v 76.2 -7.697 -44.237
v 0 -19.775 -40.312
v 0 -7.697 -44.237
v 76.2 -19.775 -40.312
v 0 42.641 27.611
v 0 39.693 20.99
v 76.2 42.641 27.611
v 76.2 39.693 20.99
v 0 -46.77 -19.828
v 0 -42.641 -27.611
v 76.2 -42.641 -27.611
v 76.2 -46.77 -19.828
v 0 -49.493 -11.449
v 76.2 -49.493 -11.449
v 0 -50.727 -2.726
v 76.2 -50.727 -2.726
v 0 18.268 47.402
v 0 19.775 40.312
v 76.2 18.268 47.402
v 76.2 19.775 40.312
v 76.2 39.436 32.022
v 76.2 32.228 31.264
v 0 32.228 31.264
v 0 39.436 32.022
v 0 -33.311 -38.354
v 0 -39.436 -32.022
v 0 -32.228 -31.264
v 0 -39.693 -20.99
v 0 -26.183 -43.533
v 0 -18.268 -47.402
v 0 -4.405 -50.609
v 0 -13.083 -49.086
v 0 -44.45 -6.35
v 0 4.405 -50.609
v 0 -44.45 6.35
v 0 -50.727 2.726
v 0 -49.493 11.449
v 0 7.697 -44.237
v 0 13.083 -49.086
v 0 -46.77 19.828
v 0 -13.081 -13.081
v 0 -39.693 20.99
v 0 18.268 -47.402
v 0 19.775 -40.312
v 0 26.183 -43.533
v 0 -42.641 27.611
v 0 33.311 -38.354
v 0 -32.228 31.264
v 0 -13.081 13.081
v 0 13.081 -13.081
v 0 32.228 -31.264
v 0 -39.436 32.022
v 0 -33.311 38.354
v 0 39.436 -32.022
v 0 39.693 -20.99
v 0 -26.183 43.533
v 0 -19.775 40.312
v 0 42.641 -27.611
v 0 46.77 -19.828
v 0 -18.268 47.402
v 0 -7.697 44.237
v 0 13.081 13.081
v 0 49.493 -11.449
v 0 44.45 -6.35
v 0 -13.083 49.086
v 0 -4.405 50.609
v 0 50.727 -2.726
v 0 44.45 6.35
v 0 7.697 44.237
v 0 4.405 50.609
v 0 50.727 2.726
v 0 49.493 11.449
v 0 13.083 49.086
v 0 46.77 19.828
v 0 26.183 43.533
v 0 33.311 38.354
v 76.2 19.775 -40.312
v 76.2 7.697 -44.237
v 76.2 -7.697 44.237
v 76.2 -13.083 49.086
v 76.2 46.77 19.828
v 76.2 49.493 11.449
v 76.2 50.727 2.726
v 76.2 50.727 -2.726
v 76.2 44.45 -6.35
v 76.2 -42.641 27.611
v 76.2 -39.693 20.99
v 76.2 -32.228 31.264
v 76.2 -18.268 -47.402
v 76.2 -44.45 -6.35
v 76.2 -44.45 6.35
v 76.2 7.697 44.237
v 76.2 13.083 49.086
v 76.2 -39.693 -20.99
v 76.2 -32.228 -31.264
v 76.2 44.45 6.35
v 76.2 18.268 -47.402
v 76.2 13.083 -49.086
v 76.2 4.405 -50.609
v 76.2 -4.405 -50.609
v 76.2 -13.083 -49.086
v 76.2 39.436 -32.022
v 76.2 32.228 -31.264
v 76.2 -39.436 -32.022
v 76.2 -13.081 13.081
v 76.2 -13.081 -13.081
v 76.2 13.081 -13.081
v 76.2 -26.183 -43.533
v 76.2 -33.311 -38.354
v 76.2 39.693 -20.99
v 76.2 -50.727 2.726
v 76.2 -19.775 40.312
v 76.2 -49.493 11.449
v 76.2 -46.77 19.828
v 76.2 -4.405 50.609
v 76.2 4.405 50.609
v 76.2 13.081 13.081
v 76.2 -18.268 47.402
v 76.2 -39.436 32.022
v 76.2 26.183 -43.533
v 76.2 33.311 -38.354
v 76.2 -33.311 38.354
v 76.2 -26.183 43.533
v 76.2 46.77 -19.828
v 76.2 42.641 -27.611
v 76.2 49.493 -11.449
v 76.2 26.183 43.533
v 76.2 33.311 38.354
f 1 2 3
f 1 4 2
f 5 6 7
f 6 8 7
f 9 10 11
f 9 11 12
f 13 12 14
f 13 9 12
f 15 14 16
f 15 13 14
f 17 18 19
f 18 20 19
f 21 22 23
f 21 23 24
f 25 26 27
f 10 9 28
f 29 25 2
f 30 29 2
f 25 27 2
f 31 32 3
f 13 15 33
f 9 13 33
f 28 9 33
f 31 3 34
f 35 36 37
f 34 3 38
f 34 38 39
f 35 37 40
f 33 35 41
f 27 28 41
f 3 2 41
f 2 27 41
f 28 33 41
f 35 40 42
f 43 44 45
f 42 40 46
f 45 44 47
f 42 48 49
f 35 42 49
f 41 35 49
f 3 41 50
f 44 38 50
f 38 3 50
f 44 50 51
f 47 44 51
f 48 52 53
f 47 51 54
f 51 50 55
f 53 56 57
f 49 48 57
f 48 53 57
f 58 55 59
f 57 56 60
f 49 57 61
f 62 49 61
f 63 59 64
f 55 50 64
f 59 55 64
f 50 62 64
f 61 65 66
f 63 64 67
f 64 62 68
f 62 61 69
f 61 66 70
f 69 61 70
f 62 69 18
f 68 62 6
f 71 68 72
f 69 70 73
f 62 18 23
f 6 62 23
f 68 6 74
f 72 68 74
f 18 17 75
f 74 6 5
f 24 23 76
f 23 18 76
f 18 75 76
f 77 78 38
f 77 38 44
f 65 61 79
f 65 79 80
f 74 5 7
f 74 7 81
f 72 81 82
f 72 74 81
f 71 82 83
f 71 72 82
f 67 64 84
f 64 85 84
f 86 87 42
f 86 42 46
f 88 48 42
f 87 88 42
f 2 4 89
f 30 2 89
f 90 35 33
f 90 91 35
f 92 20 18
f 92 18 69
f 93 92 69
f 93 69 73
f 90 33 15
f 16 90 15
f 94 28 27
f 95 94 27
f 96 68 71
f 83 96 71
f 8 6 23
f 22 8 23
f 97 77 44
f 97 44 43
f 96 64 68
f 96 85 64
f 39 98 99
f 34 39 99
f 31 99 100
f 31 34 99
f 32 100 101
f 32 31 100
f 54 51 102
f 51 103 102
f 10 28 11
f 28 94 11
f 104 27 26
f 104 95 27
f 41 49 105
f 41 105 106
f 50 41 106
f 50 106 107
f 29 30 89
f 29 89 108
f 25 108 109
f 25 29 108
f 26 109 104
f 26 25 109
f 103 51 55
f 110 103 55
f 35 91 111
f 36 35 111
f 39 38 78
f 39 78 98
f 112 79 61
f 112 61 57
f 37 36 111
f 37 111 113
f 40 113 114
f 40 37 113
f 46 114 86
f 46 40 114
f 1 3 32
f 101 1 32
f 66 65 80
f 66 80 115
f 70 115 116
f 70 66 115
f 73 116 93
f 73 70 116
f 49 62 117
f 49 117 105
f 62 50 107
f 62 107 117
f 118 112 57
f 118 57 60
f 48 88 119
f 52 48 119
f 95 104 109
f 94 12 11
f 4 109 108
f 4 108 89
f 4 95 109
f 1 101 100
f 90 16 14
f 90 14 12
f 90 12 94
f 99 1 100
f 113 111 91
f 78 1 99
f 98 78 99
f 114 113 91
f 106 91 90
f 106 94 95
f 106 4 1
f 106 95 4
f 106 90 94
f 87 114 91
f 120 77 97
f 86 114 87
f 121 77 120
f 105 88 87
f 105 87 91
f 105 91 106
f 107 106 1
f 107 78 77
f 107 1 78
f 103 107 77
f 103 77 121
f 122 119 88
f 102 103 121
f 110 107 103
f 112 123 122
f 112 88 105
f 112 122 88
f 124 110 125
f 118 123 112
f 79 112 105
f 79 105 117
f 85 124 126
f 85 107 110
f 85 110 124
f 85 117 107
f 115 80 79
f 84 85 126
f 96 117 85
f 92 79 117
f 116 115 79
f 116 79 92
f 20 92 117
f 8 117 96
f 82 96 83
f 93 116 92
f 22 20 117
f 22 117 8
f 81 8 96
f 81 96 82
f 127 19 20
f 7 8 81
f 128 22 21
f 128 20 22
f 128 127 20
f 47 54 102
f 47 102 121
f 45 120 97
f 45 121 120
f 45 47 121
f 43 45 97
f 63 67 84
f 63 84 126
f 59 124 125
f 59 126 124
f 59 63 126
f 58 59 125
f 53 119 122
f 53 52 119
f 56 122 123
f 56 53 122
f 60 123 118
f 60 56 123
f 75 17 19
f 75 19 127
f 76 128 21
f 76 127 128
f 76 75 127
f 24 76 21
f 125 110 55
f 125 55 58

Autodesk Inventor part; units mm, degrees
ref_plane "YZ Plane" through (0, 0, 0) normal (1, 0, 0) x (0, 1, 0)
ref_plane "XZ Plane" through (0, 0, 0) normal (0, 1, 0) x (-1, 0, 0)
ref_plane "XY Plane" through (0, 0, 0) normal (0, 0, 1) x (1, 0, 0)
sketch "Sketch1" plane through (0, 0, 0) normal (1, 0, 0) x (0, 1, 0)
  circle A0 centre (0, 0) radius 50.8
  line L0 (13.081, 13.081) -> (-13.081, 13.081)
  line L1 (-13.081, 13.081) -> (-13.081, -13.081)
  line L2 (-13.081, -13.081) -> (13.081, -13.081)
  line L3 (13.081, -13.081) -> (13.081, 13.081)
  point P0 (50.7268, 2.7261)
  point P1 (50.7268, -2.7261)
  dimension "d1" = 26.162
  dimension "d2" = 26.162
extrude "Extrusion2" add sketch "Sketch1" along normal blind 76.2
sketch "Sketch2" plane through (76.2, 0, 0) normal (1, 0, 0) x (0, 0, -1)
  line L0 (-6.35, 44.45) -> (-2.7261, 50.7268) projected
  line L1 (6.35, 44.45) -> (-6.35, 44.45) projected
  line L2 (-6.35, 44.45) -> (6.35, 44.45)
  line L3 (6.35, 44.45) -> (2.7261, 50.7268)
  line L4 (-6.35, 44.45) -> (-2.7261, 50.7268)
  arc A0 (2.7261, 50.7268) -> (-2.7261, 50.7268) centre (0, 0) ccw
extrude "Extrusion3" cut sketch "Sketch2" against normal blind 76.2
pattern_circular "Circular Pattern1" count 10 over 360 about axis through (0, 0, 0) along (1, 0, 0) of "Extrusion3"
sketch "Sketch3" plane through (76.2, 0, 0) normal (1, 0, 0) x (0, 0, -1)
  point P0 (0, 0)
properties part number "220525 Large Rod Notched"
